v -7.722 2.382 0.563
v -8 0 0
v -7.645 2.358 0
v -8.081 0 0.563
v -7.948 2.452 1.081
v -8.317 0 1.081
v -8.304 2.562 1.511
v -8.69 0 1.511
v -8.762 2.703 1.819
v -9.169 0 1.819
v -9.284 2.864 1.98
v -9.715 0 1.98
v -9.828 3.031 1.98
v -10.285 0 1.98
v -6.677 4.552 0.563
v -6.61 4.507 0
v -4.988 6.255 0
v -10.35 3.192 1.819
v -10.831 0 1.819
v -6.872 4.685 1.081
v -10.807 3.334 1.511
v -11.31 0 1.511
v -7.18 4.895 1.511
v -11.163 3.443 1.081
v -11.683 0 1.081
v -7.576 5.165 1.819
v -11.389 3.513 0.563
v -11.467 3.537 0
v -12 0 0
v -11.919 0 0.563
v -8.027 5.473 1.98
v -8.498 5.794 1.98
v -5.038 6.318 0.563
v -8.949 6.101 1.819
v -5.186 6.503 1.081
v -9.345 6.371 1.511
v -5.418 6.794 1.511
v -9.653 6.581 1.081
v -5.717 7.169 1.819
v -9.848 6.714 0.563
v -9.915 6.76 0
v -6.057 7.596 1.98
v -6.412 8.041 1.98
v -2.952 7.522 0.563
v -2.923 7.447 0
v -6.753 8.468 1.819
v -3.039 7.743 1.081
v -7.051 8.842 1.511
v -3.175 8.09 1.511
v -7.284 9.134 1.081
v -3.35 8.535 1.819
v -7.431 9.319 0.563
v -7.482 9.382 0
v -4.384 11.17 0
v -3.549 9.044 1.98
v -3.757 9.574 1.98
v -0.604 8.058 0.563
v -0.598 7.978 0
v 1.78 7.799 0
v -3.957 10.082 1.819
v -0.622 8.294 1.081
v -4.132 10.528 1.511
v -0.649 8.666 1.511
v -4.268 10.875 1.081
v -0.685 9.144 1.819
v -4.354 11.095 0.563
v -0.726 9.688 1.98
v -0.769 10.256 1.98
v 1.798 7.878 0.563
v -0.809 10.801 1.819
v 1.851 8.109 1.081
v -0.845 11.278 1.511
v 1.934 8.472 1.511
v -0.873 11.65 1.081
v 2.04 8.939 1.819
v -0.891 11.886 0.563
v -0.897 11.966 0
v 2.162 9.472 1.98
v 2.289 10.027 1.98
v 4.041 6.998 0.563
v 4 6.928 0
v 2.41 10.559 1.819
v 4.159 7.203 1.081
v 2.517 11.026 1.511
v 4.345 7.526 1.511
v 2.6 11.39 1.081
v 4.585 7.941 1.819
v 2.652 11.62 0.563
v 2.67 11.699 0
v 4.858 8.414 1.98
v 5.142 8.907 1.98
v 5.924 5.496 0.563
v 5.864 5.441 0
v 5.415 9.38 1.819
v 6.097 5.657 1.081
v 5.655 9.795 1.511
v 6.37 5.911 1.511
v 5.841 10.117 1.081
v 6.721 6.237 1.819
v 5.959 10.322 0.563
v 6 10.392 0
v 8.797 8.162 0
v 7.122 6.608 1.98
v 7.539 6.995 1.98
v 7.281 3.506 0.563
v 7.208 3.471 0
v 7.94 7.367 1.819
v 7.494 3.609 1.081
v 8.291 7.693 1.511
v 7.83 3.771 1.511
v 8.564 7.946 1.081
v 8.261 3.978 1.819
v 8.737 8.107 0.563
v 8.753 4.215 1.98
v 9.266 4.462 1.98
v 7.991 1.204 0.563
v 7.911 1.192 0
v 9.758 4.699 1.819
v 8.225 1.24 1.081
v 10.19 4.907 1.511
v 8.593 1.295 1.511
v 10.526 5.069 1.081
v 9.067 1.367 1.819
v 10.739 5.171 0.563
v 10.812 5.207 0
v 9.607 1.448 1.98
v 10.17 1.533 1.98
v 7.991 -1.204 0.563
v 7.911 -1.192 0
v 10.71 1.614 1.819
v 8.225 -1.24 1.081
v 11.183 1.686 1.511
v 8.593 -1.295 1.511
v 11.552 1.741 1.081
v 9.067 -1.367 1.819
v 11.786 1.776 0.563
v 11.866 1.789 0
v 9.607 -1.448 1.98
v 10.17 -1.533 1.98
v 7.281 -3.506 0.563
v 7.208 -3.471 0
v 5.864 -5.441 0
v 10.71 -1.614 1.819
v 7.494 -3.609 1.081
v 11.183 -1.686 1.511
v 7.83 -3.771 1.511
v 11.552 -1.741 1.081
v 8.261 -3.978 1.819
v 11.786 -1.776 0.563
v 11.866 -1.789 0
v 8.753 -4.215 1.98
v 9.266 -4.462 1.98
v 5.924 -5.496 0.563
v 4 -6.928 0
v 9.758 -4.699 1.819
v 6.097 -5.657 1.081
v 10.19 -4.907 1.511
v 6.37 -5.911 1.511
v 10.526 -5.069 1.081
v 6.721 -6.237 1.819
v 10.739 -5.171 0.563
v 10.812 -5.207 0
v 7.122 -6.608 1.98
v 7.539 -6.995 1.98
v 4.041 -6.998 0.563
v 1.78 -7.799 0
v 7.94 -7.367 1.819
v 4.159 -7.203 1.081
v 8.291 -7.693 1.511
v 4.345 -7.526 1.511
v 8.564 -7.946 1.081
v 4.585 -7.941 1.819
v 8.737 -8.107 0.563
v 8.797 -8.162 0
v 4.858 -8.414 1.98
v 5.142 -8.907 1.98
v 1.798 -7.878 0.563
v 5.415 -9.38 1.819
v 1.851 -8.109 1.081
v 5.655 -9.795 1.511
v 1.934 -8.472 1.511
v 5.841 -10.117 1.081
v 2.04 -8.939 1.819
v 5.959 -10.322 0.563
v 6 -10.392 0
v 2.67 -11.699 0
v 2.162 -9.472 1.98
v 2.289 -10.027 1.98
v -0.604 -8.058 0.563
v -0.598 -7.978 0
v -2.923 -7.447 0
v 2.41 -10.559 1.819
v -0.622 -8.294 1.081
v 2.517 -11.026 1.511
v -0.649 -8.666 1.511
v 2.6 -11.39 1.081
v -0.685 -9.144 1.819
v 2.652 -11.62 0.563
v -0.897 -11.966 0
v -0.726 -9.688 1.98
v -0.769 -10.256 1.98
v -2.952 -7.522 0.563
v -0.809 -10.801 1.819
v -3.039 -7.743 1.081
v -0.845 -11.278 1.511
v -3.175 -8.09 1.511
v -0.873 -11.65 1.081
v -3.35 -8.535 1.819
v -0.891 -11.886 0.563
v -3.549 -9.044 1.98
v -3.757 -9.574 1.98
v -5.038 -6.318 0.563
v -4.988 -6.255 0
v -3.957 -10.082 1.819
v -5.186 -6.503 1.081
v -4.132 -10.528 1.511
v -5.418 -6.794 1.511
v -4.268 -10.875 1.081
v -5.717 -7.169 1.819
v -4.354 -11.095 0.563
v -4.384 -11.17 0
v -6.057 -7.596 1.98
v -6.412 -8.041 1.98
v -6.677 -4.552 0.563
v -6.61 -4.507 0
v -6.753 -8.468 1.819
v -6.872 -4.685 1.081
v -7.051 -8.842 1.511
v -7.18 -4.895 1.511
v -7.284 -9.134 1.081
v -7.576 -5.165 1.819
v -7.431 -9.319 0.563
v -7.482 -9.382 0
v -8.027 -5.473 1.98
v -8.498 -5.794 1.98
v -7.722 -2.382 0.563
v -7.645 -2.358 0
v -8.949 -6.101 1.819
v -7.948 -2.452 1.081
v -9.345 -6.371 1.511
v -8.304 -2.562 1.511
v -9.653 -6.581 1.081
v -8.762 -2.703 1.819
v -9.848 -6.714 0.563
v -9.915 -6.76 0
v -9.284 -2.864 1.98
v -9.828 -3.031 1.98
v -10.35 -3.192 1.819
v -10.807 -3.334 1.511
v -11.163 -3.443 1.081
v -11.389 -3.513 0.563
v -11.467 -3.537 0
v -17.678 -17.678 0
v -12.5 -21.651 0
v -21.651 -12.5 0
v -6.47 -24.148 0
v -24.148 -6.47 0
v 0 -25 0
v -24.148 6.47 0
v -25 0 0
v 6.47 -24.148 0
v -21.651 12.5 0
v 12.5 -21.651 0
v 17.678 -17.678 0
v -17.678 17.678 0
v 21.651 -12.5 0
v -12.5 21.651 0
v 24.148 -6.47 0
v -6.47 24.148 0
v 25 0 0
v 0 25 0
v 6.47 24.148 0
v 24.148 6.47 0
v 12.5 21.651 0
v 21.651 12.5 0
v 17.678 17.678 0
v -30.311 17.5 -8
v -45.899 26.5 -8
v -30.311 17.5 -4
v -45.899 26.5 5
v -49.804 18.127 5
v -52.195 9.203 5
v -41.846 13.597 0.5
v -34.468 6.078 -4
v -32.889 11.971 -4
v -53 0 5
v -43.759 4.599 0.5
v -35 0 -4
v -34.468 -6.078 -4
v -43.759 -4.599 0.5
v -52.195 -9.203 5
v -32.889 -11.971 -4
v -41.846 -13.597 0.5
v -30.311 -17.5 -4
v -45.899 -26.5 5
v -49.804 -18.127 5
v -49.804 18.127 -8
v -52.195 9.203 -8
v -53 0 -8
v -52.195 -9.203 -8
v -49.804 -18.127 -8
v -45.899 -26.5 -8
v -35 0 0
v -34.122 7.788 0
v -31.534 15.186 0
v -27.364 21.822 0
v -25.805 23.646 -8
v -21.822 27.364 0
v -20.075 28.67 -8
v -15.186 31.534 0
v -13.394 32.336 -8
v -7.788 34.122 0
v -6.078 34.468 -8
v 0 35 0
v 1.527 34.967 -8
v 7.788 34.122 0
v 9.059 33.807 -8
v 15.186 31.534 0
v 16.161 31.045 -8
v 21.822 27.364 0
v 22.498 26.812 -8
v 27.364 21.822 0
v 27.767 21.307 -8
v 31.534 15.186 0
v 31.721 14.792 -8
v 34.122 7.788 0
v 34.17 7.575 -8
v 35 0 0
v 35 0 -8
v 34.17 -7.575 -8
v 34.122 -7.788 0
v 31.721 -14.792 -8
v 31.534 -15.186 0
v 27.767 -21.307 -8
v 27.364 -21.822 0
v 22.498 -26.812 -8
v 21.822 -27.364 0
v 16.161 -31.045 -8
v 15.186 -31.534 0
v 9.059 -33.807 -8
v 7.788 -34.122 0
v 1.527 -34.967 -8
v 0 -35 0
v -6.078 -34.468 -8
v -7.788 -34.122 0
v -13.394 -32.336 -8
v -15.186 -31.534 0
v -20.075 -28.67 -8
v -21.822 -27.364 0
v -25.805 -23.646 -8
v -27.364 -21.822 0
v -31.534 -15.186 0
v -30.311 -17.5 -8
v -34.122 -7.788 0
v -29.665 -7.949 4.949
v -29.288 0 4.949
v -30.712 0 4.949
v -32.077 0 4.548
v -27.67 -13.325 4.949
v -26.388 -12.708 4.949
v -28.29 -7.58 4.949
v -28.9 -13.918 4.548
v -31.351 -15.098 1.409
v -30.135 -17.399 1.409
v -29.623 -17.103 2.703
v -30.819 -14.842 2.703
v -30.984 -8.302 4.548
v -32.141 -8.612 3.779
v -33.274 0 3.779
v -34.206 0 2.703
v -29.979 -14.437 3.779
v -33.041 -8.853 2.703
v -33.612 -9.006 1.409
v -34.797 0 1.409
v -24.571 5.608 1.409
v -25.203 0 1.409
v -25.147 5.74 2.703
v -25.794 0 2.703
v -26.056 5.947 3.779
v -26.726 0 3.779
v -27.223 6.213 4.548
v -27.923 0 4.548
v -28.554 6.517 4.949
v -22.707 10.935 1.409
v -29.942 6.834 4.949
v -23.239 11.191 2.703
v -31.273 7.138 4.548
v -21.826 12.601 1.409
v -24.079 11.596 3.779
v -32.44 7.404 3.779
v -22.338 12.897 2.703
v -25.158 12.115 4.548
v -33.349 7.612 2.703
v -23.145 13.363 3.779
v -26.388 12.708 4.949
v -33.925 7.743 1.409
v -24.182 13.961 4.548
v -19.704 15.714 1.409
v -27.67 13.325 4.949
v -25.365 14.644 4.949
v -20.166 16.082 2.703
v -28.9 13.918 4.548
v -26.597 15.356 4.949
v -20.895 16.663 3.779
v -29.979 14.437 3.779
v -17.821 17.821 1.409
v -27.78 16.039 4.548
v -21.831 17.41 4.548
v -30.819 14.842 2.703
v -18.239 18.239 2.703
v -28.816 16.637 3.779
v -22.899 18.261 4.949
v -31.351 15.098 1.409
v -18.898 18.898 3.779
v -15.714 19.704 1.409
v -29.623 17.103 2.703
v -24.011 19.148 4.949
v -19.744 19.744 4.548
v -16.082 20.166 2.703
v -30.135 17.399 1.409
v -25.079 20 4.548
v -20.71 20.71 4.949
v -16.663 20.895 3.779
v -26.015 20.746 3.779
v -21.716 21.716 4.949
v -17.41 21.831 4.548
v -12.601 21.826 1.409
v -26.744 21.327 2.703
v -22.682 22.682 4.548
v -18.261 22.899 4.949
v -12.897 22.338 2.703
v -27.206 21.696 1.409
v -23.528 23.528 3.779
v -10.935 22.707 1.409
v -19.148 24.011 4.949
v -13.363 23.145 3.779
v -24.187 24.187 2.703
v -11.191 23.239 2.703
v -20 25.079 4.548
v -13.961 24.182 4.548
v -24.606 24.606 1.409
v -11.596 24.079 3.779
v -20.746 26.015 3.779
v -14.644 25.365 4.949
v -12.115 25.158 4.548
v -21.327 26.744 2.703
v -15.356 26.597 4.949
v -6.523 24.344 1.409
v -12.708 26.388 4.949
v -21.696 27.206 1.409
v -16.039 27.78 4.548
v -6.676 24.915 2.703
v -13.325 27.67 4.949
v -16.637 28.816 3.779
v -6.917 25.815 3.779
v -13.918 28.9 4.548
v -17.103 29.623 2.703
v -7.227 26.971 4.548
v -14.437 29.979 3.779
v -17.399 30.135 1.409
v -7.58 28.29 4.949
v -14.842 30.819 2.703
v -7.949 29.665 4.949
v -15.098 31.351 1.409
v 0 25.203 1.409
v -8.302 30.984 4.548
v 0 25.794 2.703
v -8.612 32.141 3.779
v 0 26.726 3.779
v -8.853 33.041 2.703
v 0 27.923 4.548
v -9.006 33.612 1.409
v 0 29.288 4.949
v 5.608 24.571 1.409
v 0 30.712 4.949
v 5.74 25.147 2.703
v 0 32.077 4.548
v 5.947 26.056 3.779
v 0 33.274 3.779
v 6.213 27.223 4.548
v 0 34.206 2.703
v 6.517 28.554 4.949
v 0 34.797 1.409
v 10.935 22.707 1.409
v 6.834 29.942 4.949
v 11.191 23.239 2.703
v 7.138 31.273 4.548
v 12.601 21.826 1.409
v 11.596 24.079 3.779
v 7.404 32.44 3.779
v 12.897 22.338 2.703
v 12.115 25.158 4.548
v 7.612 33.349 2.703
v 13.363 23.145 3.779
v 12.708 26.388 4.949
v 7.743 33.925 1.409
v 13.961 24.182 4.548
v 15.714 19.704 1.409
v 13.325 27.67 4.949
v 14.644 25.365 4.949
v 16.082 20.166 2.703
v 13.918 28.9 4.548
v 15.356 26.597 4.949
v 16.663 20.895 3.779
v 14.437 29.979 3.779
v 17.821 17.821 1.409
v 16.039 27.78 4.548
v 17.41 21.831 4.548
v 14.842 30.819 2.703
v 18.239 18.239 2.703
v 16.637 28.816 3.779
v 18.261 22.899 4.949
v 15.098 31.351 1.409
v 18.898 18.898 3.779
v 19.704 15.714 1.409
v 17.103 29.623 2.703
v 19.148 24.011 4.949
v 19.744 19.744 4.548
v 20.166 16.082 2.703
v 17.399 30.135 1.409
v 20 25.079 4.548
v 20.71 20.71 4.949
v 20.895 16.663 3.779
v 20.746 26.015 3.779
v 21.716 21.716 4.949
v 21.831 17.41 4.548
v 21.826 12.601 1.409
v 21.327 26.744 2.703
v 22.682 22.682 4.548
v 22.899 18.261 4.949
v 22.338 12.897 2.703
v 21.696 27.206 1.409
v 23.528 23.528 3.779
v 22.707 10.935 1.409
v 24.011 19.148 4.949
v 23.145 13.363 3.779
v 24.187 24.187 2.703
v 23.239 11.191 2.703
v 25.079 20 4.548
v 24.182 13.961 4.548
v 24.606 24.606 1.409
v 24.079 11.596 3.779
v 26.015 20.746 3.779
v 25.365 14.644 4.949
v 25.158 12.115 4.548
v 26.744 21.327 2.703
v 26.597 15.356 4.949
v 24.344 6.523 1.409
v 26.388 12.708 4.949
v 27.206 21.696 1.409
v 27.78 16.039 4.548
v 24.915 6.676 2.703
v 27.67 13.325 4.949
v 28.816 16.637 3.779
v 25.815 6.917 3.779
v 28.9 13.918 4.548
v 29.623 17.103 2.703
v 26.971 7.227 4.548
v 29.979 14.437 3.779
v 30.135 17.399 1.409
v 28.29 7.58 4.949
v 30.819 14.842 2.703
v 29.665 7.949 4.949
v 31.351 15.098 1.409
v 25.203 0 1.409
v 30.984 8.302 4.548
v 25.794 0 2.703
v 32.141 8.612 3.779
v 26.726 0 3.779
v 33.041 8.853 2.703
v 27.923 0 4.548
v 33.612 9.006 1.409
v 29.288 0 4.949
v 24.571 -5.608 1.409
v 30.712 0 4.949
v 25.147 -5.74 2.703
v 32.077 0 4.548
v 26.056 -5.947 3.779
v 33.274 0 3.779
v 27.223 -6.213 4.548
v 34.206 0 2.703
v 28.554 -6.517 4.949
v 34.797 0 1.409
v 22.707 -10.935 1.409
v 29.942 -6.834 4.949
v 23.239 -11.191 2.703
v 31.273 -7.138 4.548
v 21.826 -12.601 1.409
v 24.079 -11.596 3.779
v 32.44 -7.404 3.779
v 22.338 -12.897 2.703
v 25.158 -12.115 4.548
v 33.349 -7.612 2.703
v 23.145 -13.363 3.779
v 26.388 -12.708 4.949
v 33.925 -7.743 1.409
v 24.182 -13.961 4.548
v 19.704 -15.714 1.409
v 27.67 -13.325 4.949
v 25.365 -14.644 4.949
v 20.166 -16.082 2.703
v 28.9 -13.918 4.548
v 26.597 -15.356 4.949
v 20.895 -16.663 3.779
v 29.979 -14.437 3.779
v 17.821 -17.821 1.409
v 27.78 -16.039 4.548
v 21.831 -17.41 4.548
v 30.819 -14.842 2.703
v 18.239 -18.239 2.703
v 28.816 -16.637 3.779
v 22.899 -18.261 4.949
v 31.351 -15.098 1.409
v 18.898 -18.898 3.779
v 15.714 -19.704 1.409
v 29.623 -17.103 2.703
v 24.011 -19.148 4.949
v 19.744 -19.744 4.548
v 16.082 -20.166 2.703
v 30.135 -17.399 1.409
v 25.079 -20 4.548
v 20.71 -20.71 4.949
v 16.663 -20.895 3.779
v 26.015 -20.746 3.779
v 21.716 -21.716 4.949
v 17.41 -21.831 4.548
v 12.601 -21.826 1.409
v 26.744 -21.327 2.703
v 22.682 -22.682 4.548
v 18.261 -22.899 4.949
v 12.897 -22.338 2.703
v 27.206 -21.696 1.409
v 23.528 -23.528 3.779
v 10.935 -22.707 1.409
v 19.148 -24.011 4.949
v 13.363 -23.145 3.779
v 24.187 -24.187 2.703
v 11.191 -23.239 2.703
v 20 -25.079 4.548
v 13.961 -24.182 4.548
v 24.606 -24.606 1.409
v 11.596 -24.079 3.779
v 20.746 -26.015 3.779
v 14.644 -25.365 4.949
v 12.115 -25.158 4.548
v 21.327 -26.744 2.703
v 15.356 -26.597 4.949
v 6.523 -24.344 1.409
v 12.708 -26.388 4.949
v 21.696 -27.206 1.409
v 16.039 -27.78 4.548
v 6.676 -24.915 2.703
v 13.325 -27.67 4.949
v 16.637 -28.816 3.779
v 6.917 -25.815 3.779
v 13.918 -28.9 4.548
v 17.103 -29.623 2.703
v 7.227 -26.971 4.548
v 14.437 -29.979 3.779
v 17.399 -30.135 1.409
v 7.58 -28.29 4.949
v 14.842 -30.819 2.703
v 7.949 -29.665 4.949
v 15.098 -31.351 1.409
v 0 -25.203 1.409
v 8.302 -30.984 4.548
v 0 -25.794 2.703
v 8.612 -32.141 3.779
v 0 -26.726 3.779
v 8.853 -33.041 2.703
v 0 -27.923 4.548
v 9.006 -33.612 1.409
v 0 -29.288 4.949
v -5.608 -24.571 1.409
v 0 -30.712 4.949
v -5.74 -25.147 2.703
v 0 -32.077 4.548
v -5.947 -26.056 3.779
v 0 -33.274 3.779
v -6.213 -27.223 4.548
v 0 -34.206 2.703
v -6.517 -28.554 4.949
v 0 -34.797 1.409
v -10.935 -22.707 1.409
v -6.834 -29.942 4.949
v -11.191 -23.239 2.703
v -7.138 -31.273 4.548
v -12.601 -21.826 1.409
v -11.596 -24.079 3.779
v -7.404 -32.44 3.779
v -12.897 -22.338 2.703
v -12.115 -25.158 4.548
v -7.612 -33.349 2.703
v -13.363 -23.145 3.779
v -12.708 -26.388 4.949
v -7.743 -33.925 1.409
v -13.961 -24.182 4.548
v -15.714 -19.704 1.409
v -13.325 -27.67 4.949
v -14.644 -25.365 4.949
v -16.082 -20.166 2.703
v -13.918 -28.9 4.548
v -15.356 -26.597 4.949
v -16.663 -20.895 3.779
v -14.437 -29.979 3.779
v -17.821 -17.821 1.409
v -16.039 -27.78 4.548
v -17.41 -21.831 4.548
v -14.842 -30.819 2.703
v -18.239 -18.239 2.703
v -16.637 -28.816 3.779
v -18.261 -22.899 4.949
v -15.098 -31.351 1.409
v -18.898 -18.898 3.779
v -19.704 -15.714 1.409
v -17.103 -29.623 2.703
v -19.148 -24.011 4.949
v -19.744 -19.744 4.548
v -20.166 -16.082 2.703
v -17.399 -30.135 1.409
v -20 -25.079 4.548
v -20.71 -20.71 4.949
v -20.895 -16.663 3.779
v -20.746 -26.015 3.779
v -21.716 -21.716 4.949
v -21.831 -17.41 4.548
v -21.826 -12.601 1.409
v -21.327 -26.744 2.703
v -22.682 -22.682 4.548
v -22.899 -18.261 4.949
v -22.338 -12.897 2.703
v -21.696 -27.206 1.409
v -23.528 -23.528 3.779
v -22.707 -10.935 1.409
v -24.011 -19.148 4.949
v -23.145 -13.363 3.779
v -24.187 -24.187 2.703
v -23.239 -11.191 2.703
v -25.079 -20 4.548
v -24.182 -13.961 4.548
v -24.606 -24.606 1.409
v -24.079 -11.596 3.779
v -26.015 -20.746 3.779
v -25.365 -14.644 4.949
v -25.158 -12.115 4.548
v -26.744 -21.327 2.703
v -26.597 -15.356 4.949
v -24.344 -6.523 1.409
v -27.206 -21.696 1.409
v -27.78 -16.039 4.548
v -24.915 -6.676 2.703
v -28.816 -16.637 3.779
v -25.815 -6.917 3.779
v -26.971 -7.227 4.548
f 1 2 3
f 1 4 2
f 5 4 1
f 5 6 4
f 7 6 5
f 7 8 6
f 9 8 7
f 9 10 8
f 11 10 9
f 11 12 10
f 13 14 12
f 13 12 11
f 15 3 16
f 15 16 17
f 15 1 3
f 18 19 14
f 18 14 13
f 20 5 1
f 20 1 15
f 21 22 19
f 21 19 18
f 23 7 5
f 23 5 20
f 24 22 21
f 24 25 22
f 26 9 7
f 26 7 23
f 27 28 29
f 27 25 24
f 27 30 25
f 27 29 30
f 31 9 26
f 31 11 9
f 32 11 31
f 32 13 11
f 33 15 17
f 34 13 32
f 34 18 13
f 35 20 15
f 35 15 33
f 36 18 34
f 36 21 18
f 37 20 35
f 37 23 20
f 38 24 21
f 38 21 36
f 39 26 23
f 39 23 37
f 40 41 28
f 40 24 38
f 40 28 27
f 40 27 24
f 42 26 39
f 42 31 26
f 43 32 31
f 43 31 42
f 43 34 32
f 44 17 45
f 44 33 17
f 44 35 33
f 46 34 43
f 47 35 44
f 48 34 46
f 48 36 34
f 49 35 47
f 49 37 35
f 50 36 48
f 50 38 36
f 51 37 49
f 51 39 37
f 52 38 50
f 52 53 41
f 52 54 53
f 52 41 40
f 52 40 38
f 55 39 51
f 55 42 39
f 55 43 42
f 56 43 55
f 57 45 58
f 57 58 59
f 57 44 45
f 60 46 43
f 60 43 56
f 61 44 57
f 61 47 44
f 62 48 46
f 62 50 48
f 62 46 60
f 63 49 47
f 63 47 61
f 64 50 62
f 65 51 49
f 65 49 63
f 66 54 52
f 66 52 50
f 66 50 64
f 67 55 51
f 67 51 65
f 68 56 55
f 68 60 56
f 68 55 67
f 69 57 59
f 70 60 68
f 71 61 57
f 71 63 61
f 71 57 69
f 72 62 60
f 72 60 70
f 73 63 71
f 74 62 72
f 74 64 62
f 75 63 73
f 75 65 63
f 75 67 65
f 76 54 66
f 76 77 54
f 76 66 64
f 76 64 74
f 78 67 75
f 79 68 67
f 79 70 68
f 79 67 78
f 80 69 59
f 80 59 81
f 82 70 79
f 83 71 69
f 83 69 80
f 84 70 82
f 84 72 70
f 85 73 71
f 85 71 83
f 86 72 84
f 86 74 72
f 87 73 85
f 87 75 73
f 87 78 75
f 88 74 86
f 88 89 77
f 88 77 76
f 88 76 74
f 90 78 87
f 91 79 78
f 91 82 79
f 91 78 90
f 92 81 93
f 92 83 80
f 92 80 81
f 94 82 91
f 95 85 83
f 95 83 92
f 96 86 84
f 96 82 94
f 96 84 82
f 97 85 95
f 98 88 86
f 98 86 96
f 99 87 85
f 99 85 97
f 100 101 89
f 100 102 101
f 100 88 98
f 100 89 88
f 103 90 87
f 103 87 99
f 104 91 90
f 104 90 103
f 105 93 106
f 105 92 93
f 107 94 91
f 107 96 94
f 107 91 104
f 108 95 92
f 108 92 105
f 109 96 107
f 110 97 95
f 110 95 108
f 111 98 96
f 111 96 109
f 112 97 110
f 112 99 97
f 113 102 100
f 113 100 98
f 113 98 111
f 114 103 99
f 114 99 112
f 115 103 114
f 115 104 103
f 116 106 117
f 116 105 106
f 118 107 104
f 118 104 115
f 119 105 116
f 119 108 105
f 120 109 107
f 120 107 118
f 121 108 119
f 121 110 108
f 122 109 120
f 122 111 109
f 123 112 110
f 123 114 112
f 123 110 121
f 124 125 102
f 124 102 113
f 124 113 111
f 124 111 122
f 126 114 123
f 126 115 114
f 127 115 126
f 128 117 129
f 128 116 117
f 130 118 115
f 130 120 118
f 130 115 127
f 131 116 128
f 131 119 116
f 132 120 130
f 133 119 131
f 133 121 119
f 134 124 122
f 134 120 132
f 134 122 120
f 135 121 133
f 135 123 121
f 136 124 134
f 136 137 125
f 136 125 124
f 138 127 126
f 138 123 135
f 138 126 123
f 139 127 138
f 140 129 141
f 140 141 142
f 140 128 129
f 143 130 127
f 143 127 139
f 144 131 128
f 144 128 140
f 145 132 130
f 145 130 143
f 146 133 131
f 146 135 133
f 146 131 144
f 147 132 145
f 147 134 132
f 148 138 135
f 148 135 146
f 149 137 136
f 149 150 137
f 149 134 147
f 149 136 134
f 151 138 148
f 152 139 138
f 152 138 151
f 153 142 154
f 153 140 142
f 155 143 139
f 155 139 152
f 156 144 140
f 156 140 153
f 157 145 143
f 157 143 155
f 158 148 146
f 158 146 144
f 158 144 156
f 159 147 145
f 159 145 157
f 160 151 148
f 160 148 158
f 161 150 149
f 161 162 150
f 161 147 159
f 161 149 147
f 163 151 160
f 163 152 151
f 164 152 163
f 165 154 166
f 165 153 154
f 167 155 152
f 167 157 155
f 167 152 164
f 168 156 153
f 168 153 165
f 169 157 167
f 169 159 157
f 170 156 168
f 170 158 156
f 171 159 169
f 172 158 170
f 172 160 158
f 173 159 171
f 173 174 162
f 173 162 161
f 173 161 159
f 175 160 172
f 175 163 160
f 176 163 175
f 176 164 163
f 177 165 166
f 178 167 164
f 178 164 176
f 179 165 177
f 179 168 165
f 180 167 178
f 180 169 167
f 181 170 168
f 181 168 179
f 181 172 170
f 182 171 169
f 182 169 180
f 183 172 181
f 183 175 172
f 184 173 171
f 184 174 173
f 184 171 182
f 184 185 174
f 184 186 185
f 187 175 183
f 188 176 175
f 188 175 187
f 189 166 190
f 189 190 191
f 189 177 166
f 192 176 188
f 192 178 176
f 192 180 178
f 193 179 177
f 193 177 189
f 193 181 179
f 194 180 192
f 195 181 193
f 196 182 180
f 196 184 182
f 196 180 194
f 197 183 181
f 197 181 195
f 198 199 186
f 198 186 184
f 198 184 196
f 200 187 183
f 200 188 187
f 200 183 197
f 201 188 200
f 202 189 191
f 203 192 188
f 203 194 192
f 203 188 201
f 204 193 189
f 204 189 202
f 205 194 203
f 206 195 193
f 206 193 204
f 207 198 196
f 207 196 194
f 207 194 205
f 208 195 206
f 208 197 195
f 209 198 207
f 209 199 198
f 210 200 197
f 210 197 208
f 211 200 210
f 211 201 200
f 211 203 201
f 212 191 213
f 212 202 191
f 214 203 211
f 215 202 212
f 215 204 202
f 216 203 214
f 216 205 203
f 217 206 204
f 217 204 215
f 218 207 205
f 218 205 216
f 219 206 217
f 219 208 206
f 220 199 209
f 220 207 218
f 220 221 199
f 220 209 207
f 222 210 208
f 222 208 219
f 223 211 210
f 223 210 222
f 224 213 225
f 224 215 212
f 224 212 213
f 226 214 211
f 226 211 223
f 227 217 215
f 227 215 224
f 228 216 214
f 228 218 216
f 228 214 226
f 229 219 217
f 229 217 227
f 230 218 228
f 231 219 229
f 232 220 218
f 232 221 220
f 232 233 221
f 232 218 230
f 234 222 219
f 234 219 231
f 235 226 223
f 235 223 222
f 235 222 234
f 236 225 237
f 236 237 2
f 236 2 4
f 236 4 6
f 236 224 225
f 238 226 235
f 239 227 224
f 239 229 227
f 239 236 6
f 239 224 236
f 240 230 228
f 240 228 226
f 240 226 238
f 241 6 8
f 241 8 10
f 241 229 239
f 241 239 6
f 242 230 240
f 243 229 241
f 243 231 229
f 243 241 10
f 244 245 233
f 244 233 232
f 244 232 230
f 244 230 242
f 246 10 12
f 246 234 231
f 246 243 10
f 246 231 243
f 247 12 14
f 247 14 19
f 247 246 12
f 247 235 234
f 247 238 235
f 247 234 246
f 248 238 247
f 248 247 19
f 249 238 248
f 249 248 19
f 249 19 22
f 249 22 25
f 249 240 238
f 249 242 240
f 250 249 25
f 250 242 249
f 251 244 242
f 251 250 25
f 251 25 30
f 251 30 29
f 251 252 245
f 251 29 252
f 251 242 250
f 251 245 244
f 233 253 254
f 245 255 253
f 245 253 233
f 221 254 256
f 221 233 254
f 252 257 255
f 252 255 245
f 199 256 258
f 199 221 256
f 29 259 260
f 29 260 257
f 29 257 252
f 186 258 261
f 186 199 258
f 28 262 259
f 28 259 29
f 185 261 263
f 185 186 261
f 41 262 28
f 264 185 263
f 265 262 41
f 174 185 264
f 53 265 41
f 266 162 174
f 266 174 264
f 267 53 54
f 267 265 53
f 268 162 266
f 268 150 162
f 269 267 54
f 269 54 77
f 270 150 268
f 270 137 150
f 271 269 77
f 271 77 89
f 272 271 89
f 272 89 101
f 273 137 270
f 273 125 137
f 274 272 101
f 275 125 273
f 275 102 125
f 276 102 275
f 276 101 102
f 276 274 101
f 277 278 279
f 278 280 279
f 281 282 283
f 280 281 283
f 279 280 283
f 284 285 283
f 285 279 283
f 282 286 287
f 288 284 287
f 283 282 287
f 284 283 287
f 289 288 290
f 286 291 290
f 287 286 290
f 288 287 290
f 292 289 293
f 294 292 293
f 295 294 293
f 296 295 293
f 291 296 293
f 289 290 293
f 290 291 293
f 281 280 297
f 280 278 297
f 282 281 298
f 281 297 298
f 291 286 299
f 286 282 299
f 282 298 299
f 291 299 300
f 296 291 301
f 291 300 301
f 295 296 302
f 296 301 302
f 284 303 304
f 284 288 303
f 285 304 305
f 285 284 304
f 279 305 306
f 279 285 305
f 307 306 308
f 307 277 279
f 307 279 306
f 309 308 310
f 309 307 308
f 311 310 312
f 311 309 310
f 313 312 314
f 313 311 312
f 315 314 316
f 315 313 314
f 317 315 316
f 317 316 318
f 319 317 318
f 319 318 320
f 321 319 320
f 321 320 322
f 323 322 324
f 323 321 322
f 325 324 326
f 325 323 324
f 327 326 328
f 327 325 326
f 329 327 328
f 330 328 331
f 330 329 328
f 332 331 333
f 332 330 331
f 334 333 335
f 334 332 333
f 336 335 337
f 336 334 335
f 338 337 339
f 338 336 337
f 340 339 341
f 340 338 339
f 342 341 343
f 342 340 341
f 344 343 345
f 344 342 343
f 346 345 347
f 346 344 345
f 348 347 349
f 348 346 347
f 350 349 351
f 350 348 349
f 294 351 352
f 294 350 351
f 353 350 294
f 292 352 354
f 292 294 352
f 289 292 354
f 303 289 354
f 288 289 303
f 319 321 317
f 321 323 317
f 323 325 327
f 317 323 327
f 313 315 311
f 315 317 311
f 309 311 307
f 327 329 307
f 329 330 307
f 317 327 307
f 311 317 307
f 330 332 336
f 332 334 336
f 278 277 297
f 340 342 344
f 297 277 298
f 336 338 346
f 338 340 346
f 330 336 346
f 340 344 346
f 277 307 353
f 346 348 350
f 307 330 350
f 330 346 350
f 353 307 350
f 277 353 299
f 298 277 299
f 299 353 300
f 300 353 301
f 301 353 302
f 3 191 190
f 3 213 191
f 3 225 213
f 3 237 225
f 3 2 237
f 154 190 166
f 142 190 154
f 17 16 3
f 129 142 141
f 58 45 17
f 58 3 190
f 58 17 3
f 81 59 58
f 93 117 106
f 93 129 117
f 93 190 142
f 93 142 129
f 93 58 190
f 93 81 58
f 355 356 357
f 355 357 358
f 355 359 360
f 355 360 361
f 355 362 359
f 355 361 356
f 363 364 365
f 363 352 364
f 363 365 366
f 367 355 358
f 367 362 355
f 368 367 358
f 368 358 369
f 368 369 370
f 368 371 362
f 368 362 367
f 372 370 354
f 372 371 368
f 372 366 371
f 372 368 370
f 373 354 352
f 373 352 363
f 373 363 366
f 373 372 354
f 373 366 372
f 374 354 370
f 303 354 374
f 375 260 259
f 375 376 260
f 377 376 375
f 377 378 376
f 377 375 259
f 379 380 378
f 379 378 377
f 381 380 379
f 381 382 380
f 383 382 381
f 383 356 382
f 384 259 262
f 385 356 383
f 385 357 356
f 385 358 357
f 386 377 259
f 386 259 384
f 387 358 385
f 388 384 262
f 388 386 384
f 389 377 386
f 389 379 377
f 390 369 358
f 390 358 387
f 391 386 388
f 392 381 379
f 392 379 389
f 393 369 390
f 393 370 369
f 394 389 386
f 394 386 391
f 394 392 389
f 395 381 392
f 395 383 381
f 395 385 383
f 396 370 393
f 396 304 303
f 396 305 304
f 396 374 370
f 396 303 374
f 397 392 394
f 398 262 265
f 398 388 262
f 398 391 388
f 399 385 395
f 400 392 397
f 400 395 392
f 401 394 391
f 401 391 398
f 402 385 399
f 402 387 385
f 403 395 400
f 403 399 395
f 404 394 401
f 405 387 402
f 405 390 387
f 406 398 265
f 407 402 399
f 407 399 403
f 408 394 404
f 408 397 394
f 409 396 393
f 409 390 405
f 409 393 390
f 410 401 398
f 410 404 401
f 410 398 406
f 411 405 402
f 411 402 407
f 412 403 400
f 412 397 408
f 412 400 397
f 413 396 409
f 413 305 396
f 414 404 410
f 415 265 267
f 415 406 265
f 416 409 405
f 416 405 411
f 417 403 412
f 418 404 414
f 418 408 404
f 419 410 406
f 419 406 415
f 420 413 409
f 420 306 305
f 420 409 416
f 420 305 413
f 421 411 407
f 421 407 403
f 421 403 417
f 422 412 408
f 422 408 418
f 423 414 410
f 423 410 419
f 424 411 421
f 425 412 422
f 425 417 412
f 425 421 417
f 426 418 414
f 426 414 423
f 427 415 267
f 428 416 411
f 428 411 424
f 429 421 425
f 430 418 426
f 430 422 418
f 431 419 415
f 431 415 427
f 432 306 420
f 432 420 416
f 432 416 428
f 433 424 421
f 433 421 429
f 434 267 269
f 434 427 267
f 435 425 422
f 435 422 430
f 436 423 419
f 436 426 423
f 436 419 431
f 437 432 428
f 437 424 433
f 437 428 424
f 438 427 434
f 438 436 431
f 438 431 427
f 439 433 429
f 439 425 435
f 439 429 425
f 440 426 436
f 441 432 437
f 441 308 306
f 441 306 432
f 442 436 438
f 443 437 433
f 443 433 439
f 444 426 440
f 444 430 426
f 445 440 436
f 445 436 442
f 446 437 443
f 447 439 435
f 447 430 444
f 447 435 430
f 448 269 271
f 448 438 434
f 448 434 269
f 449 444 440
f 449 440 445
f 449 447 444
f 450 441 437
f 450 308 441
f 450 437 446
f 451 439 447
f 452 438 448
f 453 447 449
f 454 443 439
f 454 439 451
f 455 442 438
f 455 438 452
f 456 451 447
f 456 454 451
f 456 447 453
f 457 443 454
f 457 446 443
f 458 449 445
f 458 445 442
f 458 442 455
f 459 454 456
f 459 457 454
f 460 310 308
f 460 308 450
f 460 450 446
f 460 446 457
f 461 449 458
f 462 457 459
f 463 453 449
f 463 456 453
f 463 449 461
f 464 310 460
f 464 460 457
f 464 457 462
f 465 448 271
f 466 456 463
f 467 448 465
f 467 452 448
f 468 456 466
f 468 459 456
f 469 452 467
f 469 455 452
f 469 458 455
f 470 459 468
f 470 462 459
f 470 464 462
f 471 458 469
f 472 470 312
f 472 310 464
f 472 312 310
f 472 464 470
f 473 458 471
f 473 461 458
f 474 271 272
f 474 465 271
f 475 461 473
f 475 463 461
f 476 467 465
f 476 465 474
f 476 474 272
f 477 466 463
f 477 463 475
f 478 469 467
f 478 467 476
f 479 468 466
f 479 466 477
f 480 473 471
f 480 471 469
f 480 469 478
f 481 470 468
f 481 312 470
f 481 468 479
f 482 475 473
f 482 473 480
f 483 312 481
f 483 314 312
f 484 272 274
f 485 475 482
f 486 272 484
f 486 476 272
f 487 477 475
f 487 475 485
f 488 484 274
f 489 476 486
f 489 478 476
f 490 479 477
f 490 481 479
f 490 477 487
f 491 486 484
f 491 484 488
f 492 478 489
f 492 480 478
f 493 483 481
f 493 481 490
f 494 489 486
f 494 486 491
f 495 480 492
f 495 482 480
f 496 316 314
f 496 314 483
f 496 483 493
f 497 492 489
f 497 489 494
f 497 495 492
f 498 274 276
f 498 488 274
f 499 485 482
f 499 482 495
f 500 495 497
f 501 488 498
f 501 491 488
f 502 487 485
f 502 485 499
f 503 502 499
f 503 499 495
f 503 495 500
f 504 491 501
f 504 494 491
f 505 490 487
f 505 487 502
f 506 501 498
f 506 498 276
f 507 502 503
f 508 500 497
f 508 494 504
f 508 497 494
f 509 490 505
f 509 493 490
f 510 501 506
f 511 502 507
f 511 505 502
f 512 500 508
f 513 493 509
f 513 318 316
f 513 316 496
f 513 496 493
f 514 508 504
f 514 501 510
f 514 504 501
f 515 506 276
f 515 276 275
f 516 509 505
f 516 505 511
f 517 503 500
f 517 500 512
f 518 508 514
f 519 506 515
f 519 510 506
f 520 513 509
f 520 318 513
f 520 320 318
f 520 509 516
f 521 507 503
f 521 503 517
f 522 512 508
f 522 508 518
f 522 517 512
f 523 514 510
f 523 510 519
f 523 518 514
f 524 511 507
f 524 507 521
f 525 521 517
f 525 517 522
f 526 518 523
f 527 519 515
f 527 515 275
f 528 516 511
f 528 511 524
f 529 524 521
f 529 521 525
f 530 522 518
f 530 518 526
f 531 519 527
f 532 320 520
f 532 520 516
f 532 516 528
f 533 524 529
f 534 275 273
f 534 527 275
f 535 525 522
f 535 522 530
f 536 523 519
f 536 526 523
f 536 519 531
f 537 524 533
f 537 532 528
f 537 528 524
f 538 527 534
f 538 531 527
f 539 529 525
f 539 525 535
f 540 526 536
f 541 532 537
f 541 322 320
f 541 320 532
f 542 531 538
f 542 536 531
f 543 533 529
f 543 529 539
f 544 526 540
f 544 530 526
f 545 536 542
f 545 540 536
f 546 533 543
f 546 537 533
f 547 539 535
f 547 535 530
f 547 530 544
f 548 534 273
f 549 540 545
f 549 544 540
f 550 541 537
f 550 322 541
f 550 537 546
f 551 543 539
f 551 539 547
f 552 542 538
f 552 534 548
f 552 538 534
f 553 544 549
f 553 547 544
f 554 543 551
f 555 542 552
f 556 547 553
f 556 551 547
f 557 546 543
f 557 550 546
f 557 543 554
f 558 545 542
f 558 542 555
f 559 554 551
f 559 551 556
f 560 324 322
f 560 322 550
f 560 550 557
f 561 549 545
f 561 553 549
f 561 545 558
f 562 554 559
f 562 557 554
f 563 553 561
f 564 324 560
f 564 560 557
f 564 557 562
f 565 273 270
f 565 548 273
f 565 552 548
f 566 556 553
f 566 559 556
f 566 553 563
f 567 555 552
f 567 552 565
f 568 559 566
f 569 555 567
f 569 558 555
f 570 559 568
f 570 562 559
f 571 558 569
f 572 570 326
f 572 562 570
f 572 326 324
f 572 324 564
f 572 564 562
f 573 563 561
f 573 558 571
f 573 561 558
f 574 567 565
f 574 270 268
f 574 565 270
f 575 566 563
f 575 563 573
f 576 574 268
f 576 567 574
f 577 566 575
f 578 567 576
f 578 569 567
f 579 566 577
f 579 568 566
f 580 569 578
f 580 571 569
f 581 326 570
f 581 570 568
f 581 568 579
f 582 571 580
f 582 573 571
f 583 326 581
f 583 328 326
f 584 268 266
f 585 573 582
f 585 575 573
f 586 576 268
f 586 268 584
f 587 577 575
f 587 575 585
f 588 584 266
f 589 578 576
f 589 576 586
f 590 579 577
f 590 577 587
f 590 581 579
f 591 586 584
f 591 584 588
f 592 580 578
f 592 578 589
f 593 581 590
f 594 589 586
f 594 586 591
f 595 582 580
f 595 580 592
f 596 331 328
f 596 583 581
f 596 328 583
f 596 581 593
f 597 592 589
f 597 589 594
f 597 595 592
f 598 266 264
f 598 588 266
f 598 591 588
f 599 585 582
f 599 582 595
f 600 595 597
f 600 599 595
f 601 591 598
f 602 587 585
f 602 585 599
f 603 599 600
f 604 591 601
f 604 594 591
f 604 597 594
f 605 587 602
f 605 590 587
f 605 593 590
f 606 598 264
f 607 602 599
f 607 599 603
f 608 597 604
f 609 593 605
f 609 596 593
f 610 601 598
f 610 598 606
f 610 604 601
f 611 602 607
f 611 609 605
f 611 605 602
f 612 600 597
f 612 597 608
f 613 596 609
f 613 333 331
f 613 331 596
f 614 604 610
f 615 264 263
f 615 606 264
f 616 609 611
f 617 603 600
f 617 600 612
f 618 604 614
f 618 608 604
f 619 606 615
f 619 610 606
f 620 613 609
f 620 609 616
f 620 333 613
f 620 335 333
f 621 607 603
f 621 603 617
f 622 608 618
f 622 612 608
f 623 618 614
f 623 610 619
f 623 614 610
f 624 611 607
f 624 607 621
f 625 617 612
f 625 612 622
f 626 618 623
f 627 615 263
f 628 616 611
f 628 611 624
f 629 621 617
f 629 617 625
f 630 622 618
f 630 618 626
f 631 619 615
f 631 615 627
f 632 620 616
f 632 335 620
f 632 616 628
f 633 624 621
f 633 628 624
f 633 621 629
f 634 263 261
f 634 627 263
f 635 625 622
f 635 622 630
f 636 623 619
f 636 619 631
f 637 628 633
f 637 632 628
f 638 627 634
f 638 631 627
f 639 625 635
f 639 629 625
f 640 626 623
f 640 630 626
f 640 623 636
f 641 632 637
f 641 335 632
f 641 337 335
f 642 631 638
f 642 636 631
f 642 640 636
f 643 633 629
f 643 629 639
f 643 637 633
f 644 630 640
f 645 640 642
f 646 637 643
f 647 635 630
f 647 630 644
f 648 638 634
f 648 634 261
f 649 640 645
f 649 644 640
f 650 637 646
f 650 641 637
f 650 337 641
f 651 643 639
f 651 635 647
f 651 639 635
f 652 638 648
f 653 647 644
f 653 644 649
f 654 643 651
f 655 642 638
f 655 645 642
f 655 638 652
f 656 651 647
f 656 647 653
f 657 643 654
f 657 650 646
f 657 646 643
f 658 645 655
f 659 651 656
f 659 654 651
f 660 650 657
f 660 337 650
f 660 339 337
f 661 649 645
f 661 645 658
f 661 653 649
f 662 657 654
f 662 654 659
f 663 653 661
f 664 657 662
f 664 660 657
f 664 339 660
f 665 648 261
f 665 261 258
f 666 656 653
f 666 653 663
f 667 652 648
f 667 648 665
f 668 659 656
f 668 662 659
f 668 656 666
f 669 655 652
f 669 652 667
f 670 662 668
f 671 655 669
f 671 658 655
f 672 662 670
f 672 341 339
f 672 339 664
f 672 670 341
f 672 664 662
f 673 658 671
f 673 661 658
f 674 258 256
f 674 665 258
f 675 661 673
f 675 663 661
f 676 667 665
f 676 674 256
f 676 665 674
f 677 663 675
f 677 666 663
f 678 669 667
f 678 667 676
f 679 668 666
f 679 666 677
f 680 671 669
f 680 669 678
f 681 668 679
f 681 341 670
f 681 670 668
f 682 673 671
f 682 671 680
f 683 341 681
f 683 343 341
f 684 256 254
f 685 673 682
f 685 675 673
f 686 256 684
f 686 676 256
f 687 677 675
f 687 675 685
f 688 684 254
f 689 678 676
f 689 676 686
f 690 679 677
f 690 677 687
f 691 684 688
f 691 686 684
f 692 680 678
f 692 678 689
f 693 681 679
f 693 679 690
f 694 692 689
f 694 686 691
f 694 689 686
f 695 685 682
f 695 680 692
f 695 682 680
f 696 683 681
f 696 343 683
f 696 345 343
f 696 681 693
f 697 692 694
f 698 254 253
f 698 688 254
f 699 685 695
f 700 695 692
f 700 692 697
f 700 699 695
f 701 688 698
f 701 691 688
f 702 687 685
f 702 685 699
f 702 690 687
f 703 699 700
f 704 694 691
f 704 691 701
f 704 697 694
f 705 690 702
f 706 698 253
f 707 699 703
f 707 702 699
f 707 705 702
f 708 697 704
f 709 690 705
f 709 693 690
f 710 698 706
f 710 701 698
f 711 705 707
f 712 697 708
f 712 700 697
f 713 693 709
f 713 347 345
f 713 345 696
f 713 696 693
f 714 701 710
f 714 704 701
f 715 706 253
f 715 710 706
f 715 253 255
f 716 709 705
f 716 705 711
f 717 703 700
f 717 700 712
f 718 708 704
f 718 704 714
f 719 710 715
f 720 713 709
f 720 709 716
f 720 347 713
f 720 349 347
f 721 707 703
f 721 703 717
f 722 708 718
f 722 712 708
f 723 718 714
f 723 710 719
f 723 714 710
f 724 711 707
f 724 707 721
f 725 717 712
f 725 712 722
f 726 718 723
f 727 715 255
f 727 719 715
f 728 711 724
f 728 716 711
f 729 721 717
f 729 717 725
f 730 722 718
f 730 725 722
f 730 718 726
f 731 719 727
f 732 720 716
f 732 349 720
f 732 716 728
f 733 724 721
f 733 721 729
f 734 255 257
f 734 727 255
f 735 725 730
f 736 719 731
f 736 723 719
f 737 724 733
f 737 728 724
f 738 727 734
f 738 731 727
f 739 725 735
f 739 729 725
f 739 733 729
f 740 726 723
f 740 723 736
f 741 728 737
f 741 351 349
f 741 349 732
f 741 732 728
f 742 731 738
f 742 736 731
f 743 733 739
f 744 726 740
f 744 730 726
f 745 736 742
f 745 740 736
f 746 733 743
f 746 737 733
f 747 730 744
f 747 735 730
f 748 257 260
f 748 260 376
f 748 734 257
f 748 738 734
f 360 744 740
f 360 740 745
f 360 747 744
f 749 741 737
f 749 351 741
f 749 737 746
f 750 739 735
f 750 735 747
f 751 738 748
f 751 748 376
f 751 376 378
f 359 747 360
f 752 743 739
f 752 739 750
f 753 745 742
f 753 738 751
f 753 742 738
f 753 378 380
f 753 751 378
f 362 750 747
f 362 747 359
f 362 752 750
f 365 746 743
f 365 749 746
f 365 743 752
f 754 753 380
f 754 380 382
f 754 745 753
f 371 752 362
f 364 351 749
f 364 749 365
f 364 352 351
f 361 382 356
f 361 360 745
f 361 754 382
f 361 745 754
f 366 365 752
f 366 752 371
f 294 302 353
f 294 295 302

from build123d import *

# Parameters (mm, degrees)
F2_ANGLE = 60


with BuildPart() as f1:
    # F0 (on Front) → F1 (revolve)
    with BuildSketch(Plane.XZ):
        with BuildLine():
            Line((0, -8), (0, 0))
            Line((0, 0), (-8, 0))
            Line((-8, 0), (-12, 0))
            Line((-12, 0), (-25, 0))
            ThreePointArc((-25, 0), (-30, 5), (-35, 0))
            Line((-35, 0), (-35, -4))
            Line((-35, -4), (-35, -8))
            Line((-35, -8), (0, -8))
        make_face()
        with BuildLine():
            Line((-12, 0), (-8, 0))
            ThreePointArc((-8, 0), (-10, 2), (-12, 0))
        make_face()
    revolve(axis=Axis((0, 0, -4), (0, 0, -1)))

    # F0 (on Front) → F2 (revolve, symmetric)
    with BuildSketch(Plane.XZ) as f2_sk:
        Polygon((-53, -8), (-35, -8), (-35, -4), (-53, 5), align=None)
    revolve(axis=Axis((0, 0, -4), (0, 0, -1)), revolution_arc=F2_ANGLE / 2)
    revolve(f2_sk.sketch, axis=Axis((0, 0, -4), (0, 0, 1)), revolution_arc=F2_ANGLE / 2)


solid = f1.part
